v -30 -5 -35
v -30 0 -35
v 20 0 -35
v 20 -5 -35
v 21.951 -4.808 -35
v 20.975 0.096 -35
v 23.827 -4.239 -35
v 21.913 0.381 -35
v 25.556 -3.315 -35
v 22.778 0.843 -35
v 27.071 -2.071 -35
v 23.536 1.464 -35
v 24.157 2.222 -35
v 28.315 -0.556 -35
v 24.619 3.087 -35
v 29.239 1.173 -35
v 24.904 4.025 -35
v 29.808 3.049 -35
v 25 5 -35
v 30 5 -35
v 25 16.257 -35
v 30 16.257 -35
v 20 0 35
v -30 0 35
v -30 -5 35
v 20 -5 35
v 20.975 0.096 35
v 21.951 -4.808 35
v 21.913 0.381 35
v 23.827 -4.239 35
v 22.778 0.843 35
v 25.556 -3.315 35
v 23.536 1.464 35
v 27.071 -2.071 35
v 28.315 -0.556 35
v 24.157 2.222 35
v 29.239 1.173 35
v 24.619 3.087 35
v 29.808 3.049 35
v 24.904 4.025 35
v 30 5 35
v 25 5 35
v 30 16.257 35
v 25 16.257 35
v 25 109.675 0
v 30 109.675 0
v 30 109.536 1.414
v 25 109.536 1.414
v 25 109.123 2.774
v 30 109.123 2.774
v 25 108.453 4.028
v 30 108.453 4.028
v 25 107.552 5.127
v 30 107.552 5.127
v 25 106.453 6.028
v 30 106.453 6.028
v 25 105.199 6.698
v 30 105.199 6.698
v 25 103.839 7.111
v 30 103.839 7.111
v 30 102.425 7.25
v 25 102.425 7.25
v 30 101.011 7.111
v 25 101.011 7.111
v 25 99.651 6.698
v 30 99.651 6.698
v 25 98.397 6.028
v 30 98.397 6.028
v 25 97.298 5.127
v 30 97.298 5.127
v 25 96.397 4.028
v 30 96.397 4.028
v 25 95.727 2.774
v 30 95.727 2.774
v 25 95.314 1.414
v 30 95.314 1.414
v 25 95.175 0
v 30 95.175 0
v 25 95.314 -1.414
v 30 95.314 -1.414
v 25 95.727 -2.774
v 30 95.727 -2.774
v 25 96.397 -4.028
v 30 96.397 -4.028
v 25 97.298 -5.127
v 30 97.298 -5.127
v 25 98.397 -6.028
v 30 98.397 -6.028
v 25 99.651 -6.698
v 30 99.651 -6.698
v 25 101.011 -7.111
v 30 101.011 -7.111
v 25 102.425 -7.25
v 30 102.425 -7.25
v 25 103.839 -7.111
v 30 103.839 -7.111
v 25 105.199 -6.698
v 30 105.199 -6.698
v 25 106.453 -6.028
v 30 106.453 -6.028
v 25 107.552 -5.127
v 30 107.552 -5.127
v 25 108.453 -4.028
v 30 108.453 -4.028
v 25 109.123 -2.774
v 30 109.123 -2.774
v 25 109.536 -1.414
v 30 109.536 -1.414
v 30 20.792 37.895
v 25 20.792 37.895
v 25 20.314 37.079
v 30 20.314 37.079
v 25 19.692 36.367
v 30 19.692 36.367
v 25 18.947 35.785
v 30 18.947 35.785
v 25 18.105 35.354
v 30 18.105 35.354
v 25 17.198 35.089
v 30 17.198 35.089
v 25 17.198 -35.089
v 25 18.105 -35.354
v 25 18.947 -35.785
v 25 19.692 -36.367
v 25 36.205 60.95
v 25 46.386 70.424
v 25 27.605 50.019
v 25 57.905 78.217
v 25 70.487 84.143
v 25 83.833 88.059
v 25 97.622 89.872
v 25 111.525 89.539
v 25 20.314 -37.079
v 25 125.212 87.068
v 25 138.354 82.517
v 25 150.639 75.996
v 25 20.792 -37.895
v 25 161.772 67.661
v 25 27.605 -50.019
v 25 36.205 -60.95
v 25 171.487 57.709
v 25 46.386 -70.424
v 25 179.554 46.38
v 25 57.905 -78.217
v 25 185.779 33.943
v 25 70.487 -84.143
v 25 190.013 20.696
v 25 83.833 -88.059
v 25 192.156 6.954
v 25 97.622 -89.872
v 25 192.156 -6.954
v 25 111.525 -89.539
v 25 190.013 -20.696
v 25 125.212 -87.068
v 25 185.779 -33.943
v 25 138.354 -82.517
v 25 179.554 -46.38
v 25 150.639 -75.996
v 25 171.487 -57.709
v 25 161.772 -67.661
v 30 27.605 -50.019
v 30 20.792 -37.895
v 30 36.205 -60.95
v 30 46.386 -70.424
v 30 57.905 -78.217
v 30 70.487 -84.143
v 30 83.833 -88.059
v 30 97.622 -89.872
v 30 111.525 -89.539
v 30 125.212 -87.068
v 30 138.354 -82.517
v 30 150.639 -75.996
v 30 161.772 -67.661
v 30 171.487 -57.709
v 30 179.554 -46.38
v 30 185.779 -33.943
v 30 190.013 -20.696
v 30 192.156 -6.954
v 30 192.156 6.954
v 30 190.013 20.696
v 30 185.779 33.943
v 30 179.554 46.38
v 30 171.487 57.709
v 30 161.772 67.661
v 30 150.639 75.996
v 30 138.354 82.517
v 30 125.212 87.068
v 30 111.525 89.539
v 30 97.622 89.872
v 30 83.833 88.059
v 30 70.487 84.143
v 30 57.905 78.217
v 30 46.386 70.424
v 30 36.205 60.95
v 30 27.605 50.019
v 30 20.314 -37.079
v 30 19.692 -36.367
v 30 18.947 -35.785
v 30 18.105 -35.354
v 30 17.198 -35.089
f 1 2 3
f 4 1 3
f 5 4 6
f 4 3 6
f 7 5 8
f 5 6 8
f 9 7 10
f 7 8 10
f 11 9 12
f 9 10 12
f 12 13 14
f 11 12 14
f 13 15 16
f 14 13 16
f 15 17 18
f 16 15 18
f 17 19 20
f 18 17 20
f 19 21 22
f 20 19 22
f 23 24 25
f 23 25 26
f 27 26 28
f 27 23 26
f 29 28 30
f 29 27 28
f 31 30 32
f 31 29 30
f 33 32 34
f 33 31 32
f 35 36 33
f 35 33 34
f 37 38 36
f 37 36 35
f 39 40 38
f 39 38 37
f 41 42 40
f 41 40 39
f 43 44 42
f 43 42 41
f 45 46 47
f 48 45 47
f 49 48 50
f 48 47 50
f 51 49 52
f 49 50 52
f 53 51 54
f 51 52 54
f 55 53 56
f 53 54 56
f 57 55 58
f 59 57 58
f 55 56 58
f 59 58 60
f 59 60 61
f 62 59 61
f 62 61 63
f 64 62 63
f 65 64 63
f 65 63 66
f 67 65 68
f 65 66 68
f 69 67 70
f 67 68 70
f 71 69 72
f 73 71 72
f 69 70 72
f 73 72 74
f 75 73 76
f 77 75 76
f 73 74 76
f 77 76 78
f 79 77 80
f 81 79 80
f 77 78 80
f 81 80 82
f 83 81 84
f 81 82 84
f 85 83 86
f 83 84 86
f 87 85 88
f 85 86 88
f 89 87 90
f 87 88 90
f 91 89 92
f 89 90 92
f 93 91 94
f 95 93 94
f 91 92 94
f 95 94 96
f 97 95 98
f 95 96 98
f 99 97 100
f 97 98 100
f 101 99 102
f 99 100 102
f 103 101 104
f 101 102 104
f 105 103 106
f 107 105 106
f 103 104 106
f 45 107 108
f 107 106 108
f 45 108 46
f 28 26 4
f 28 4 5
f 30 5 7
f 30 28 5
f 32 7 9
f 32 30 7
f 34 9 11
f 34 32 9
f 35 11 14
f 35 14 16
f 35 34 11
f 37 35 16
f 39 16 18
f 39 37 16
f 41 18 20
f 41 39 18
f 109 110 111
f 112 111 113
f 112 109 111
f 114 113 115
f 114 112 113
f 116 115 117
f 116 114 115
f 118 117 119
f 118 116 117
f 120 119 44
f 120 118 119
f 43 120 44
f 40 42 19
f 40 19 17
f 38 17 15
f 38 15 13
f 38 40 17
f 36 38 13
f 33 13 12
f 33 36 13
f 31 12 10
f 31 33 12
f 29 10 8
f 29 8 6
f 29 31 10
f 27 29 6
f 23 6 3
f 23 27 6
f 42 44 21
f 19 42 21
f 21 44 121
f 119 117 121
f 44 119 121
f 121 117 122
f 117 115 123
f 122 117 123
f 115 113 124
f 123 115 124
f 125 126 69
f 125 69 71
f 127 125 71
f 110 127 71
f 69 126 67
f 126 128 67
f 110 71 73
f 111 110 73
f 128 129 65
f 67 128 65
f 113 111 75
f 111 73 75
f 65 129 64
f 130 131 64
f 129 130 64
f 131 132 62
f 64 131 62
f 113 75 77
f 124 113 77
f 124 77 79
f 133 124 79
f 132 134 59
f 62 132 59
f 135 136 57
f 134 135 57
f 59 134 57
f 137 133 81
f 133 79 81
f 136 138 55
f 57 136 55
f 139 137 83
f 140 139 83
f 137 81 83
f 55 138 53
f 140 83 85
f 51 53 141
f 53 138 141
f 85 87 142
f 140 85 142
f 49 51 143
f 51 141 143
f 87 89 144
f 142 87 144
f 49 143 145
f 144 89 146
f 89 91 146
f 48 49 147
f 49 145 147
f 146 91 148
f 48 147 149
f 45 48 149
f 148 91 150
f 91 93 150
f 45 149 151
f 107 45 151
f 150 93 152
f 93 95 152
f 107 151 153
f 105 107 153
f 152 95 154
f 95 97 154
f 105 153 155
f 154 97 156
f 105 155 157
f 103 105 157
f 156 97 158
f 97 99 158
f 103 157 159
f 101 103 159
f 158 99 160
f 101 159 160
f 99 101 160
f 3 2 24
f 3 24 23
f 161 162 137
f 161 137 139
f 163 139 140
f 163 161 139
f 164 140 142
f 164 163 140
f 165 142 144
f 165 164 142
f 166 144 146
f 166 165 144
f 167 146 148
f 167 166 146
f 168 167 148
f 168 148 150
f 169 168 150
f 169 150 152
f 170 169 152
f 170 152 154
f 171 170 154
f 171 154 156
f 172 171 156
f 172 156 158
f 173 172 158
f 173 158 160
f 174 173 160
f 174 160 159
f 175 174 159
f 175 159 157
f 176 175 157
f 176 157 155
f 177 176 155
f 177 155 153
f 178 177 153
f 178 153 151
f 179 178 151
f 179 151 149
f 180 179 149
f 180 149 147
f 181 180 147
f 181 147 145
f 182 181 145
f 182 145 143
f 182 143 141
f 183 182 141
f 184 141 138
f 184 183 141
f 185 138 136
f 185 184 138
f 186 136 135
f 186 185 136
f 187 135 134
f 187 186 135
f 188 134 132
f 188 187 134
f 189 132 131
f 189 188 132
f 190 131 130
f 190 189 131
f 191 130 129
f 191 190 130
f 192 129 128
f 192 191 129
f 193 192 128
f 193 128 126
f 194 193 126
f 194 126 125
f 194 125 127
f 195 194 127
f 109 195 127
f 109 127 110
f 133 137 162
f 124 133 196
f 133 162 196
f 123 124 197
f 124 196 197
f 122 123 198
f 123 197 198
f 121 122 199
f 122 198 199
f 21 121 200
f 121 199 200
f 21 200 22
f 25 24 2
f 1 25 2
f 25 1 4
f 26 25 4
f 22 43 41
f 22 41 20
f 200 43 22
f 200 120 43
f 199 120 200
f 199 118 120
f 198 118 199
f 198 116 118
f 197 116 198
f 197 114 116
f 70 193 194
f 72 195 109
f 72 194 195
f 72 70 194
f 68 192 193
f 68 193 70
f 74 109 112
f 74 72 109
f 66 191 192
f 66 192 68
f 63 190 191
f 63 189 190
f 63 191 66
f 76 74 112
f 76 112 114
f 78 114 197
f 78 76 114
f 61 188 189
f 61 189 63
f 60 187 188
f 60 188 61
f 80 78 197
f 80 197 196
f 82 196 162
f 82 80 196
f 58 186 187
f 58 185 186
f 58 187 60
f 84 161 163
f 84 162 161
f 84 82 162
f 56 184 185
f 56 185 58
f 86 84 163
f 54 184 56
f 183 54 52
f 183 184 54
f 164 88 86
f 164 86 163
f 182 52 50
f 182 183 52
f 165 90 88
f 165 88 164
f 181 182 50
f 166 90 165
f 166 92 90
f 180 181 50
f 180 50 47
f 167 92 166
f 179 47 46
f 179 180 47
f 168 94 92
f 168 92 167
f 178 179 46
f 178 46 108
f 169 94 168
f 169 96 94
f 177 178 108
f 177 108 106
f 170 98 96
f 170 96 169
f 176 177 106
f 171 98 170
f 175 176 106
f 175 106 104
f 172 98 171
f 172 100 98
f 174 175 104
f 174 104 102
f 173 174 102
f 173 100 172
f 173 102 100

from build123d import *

# Parameters (mm, degrees)
ESBO_O1_W                      = 60
ESBO_O1_H                      = 70
FLANGE_BASE1_DEPTH             = 5
ARESTA_FLANGE1_STRIP_W         = 30
ARESTA_FLANGE1_STRIP_H         = 5
ARESTA_FLANGE1_STRIP_CUT_DEPTH = 70
ARESTA_FLANGE1_DEPTH           = 70
ESBO_O9_R                      = 90
ABA1_DEPTH                     = 5
FILETE5_R                      = 5
FILETE6_R                      = 5
ESBO_O10_R                     = 7.25
CORTE_EXTRUS_O1_DEPTH          = 5


# Sheet-metal steps are written as plain solids
with BuildPart() as part:
    # Esboço1 → Flange-base1 (new body)
    with BuildSketch(Plane(origin=(0, 0, 0), x_dir=(1, 0, 0), z_dir=(0, 1, 0))):
        Rectangle(ESBO_O1_W, ESBO_O1_H)
    extrude(amount=-FLANGE_BASE1_DEPTH)

    # Aresta-Flange1 strip (across the edge) → Aresta-Flange1 strip cut (cut)
    with BuildSketch(Plane(origin=(30, 0, 35), x_dir=(-1, 0, 0), z_dir=(0, 0, -1))):
        with Locations((-5, -2.5)):
            Rectangle(ARESTA_FLANGE1_STRIP_W, ARESTA_FLANGE1_STRIP_H)
    extrude(amount=ARESTA_FLANGE1_STRIP_CUT_DEPTH, mode=Mode.SUBTRACT)

    # Aresta-Flange1 section (across the edge) → Aresta-Flange1 (add)
    with BuildSketch(Plane(origin=(30, 0, 35), x_dir=(-1, 0, 0), z_dir=(0, 0, -1))):
        with BuildLine():
            Line((0, 5), (0, 86))
            Line((0, 86), (5, 86))
            Line((5, 86), (5, 5))
            ThreePointArc((5, 5), (6.464466094, 1.464466094), (10, 0))
            Line((10, 0), (10, -5))
            ThreePointArc((10, -5), (2.928932188, -2.071067812), (0, 5))
        make_face()
    extrude(amount=ARESTA_FLANGE1_DEPTH)

    # Esboço9 → Aba1 (add)
    with BuildSketch(Plane(origin=(30, 0, 0), x_dir=(0, 0, -1), z_dir=(1, 0, 0))):
        with Locations((0, 102.425)):
            Circle(ESBO_O9_R)
    extrude(amount=-ABA1_DEPTH)

    # Filete5
    filete5_edges = [part.edges().sort_by_distance(p)[0] for p in [
        (27.5, 19.509380241, -35),
    ]]
    fillet(filete5_edges, radius=FILETE5_R)

    # Filete6
    filete6_edges = [part.edges().sort_by_distance(p)[0] for p in [
        (27.5, 19.509380241, 35),
    ]]
    fillet(filete6_edges, radius=FILETE6_R)

    # Esboço10 → Corte-extrusão1 (cut)
    with BuildSketch(Plane(origin=(30, 0, 0), x_dir=(0, 0, -1), z_dir=(1, 0, 0))):
        with Locations(Location((0, 102.425, 0), (0, 0, 90))):
            Circle(ESBO_O10_R)
    extrude(amount=-CORTE_EXTRUS_O1_DEPTH, mode=Mode.SUBTRACT)


solid = part.part
